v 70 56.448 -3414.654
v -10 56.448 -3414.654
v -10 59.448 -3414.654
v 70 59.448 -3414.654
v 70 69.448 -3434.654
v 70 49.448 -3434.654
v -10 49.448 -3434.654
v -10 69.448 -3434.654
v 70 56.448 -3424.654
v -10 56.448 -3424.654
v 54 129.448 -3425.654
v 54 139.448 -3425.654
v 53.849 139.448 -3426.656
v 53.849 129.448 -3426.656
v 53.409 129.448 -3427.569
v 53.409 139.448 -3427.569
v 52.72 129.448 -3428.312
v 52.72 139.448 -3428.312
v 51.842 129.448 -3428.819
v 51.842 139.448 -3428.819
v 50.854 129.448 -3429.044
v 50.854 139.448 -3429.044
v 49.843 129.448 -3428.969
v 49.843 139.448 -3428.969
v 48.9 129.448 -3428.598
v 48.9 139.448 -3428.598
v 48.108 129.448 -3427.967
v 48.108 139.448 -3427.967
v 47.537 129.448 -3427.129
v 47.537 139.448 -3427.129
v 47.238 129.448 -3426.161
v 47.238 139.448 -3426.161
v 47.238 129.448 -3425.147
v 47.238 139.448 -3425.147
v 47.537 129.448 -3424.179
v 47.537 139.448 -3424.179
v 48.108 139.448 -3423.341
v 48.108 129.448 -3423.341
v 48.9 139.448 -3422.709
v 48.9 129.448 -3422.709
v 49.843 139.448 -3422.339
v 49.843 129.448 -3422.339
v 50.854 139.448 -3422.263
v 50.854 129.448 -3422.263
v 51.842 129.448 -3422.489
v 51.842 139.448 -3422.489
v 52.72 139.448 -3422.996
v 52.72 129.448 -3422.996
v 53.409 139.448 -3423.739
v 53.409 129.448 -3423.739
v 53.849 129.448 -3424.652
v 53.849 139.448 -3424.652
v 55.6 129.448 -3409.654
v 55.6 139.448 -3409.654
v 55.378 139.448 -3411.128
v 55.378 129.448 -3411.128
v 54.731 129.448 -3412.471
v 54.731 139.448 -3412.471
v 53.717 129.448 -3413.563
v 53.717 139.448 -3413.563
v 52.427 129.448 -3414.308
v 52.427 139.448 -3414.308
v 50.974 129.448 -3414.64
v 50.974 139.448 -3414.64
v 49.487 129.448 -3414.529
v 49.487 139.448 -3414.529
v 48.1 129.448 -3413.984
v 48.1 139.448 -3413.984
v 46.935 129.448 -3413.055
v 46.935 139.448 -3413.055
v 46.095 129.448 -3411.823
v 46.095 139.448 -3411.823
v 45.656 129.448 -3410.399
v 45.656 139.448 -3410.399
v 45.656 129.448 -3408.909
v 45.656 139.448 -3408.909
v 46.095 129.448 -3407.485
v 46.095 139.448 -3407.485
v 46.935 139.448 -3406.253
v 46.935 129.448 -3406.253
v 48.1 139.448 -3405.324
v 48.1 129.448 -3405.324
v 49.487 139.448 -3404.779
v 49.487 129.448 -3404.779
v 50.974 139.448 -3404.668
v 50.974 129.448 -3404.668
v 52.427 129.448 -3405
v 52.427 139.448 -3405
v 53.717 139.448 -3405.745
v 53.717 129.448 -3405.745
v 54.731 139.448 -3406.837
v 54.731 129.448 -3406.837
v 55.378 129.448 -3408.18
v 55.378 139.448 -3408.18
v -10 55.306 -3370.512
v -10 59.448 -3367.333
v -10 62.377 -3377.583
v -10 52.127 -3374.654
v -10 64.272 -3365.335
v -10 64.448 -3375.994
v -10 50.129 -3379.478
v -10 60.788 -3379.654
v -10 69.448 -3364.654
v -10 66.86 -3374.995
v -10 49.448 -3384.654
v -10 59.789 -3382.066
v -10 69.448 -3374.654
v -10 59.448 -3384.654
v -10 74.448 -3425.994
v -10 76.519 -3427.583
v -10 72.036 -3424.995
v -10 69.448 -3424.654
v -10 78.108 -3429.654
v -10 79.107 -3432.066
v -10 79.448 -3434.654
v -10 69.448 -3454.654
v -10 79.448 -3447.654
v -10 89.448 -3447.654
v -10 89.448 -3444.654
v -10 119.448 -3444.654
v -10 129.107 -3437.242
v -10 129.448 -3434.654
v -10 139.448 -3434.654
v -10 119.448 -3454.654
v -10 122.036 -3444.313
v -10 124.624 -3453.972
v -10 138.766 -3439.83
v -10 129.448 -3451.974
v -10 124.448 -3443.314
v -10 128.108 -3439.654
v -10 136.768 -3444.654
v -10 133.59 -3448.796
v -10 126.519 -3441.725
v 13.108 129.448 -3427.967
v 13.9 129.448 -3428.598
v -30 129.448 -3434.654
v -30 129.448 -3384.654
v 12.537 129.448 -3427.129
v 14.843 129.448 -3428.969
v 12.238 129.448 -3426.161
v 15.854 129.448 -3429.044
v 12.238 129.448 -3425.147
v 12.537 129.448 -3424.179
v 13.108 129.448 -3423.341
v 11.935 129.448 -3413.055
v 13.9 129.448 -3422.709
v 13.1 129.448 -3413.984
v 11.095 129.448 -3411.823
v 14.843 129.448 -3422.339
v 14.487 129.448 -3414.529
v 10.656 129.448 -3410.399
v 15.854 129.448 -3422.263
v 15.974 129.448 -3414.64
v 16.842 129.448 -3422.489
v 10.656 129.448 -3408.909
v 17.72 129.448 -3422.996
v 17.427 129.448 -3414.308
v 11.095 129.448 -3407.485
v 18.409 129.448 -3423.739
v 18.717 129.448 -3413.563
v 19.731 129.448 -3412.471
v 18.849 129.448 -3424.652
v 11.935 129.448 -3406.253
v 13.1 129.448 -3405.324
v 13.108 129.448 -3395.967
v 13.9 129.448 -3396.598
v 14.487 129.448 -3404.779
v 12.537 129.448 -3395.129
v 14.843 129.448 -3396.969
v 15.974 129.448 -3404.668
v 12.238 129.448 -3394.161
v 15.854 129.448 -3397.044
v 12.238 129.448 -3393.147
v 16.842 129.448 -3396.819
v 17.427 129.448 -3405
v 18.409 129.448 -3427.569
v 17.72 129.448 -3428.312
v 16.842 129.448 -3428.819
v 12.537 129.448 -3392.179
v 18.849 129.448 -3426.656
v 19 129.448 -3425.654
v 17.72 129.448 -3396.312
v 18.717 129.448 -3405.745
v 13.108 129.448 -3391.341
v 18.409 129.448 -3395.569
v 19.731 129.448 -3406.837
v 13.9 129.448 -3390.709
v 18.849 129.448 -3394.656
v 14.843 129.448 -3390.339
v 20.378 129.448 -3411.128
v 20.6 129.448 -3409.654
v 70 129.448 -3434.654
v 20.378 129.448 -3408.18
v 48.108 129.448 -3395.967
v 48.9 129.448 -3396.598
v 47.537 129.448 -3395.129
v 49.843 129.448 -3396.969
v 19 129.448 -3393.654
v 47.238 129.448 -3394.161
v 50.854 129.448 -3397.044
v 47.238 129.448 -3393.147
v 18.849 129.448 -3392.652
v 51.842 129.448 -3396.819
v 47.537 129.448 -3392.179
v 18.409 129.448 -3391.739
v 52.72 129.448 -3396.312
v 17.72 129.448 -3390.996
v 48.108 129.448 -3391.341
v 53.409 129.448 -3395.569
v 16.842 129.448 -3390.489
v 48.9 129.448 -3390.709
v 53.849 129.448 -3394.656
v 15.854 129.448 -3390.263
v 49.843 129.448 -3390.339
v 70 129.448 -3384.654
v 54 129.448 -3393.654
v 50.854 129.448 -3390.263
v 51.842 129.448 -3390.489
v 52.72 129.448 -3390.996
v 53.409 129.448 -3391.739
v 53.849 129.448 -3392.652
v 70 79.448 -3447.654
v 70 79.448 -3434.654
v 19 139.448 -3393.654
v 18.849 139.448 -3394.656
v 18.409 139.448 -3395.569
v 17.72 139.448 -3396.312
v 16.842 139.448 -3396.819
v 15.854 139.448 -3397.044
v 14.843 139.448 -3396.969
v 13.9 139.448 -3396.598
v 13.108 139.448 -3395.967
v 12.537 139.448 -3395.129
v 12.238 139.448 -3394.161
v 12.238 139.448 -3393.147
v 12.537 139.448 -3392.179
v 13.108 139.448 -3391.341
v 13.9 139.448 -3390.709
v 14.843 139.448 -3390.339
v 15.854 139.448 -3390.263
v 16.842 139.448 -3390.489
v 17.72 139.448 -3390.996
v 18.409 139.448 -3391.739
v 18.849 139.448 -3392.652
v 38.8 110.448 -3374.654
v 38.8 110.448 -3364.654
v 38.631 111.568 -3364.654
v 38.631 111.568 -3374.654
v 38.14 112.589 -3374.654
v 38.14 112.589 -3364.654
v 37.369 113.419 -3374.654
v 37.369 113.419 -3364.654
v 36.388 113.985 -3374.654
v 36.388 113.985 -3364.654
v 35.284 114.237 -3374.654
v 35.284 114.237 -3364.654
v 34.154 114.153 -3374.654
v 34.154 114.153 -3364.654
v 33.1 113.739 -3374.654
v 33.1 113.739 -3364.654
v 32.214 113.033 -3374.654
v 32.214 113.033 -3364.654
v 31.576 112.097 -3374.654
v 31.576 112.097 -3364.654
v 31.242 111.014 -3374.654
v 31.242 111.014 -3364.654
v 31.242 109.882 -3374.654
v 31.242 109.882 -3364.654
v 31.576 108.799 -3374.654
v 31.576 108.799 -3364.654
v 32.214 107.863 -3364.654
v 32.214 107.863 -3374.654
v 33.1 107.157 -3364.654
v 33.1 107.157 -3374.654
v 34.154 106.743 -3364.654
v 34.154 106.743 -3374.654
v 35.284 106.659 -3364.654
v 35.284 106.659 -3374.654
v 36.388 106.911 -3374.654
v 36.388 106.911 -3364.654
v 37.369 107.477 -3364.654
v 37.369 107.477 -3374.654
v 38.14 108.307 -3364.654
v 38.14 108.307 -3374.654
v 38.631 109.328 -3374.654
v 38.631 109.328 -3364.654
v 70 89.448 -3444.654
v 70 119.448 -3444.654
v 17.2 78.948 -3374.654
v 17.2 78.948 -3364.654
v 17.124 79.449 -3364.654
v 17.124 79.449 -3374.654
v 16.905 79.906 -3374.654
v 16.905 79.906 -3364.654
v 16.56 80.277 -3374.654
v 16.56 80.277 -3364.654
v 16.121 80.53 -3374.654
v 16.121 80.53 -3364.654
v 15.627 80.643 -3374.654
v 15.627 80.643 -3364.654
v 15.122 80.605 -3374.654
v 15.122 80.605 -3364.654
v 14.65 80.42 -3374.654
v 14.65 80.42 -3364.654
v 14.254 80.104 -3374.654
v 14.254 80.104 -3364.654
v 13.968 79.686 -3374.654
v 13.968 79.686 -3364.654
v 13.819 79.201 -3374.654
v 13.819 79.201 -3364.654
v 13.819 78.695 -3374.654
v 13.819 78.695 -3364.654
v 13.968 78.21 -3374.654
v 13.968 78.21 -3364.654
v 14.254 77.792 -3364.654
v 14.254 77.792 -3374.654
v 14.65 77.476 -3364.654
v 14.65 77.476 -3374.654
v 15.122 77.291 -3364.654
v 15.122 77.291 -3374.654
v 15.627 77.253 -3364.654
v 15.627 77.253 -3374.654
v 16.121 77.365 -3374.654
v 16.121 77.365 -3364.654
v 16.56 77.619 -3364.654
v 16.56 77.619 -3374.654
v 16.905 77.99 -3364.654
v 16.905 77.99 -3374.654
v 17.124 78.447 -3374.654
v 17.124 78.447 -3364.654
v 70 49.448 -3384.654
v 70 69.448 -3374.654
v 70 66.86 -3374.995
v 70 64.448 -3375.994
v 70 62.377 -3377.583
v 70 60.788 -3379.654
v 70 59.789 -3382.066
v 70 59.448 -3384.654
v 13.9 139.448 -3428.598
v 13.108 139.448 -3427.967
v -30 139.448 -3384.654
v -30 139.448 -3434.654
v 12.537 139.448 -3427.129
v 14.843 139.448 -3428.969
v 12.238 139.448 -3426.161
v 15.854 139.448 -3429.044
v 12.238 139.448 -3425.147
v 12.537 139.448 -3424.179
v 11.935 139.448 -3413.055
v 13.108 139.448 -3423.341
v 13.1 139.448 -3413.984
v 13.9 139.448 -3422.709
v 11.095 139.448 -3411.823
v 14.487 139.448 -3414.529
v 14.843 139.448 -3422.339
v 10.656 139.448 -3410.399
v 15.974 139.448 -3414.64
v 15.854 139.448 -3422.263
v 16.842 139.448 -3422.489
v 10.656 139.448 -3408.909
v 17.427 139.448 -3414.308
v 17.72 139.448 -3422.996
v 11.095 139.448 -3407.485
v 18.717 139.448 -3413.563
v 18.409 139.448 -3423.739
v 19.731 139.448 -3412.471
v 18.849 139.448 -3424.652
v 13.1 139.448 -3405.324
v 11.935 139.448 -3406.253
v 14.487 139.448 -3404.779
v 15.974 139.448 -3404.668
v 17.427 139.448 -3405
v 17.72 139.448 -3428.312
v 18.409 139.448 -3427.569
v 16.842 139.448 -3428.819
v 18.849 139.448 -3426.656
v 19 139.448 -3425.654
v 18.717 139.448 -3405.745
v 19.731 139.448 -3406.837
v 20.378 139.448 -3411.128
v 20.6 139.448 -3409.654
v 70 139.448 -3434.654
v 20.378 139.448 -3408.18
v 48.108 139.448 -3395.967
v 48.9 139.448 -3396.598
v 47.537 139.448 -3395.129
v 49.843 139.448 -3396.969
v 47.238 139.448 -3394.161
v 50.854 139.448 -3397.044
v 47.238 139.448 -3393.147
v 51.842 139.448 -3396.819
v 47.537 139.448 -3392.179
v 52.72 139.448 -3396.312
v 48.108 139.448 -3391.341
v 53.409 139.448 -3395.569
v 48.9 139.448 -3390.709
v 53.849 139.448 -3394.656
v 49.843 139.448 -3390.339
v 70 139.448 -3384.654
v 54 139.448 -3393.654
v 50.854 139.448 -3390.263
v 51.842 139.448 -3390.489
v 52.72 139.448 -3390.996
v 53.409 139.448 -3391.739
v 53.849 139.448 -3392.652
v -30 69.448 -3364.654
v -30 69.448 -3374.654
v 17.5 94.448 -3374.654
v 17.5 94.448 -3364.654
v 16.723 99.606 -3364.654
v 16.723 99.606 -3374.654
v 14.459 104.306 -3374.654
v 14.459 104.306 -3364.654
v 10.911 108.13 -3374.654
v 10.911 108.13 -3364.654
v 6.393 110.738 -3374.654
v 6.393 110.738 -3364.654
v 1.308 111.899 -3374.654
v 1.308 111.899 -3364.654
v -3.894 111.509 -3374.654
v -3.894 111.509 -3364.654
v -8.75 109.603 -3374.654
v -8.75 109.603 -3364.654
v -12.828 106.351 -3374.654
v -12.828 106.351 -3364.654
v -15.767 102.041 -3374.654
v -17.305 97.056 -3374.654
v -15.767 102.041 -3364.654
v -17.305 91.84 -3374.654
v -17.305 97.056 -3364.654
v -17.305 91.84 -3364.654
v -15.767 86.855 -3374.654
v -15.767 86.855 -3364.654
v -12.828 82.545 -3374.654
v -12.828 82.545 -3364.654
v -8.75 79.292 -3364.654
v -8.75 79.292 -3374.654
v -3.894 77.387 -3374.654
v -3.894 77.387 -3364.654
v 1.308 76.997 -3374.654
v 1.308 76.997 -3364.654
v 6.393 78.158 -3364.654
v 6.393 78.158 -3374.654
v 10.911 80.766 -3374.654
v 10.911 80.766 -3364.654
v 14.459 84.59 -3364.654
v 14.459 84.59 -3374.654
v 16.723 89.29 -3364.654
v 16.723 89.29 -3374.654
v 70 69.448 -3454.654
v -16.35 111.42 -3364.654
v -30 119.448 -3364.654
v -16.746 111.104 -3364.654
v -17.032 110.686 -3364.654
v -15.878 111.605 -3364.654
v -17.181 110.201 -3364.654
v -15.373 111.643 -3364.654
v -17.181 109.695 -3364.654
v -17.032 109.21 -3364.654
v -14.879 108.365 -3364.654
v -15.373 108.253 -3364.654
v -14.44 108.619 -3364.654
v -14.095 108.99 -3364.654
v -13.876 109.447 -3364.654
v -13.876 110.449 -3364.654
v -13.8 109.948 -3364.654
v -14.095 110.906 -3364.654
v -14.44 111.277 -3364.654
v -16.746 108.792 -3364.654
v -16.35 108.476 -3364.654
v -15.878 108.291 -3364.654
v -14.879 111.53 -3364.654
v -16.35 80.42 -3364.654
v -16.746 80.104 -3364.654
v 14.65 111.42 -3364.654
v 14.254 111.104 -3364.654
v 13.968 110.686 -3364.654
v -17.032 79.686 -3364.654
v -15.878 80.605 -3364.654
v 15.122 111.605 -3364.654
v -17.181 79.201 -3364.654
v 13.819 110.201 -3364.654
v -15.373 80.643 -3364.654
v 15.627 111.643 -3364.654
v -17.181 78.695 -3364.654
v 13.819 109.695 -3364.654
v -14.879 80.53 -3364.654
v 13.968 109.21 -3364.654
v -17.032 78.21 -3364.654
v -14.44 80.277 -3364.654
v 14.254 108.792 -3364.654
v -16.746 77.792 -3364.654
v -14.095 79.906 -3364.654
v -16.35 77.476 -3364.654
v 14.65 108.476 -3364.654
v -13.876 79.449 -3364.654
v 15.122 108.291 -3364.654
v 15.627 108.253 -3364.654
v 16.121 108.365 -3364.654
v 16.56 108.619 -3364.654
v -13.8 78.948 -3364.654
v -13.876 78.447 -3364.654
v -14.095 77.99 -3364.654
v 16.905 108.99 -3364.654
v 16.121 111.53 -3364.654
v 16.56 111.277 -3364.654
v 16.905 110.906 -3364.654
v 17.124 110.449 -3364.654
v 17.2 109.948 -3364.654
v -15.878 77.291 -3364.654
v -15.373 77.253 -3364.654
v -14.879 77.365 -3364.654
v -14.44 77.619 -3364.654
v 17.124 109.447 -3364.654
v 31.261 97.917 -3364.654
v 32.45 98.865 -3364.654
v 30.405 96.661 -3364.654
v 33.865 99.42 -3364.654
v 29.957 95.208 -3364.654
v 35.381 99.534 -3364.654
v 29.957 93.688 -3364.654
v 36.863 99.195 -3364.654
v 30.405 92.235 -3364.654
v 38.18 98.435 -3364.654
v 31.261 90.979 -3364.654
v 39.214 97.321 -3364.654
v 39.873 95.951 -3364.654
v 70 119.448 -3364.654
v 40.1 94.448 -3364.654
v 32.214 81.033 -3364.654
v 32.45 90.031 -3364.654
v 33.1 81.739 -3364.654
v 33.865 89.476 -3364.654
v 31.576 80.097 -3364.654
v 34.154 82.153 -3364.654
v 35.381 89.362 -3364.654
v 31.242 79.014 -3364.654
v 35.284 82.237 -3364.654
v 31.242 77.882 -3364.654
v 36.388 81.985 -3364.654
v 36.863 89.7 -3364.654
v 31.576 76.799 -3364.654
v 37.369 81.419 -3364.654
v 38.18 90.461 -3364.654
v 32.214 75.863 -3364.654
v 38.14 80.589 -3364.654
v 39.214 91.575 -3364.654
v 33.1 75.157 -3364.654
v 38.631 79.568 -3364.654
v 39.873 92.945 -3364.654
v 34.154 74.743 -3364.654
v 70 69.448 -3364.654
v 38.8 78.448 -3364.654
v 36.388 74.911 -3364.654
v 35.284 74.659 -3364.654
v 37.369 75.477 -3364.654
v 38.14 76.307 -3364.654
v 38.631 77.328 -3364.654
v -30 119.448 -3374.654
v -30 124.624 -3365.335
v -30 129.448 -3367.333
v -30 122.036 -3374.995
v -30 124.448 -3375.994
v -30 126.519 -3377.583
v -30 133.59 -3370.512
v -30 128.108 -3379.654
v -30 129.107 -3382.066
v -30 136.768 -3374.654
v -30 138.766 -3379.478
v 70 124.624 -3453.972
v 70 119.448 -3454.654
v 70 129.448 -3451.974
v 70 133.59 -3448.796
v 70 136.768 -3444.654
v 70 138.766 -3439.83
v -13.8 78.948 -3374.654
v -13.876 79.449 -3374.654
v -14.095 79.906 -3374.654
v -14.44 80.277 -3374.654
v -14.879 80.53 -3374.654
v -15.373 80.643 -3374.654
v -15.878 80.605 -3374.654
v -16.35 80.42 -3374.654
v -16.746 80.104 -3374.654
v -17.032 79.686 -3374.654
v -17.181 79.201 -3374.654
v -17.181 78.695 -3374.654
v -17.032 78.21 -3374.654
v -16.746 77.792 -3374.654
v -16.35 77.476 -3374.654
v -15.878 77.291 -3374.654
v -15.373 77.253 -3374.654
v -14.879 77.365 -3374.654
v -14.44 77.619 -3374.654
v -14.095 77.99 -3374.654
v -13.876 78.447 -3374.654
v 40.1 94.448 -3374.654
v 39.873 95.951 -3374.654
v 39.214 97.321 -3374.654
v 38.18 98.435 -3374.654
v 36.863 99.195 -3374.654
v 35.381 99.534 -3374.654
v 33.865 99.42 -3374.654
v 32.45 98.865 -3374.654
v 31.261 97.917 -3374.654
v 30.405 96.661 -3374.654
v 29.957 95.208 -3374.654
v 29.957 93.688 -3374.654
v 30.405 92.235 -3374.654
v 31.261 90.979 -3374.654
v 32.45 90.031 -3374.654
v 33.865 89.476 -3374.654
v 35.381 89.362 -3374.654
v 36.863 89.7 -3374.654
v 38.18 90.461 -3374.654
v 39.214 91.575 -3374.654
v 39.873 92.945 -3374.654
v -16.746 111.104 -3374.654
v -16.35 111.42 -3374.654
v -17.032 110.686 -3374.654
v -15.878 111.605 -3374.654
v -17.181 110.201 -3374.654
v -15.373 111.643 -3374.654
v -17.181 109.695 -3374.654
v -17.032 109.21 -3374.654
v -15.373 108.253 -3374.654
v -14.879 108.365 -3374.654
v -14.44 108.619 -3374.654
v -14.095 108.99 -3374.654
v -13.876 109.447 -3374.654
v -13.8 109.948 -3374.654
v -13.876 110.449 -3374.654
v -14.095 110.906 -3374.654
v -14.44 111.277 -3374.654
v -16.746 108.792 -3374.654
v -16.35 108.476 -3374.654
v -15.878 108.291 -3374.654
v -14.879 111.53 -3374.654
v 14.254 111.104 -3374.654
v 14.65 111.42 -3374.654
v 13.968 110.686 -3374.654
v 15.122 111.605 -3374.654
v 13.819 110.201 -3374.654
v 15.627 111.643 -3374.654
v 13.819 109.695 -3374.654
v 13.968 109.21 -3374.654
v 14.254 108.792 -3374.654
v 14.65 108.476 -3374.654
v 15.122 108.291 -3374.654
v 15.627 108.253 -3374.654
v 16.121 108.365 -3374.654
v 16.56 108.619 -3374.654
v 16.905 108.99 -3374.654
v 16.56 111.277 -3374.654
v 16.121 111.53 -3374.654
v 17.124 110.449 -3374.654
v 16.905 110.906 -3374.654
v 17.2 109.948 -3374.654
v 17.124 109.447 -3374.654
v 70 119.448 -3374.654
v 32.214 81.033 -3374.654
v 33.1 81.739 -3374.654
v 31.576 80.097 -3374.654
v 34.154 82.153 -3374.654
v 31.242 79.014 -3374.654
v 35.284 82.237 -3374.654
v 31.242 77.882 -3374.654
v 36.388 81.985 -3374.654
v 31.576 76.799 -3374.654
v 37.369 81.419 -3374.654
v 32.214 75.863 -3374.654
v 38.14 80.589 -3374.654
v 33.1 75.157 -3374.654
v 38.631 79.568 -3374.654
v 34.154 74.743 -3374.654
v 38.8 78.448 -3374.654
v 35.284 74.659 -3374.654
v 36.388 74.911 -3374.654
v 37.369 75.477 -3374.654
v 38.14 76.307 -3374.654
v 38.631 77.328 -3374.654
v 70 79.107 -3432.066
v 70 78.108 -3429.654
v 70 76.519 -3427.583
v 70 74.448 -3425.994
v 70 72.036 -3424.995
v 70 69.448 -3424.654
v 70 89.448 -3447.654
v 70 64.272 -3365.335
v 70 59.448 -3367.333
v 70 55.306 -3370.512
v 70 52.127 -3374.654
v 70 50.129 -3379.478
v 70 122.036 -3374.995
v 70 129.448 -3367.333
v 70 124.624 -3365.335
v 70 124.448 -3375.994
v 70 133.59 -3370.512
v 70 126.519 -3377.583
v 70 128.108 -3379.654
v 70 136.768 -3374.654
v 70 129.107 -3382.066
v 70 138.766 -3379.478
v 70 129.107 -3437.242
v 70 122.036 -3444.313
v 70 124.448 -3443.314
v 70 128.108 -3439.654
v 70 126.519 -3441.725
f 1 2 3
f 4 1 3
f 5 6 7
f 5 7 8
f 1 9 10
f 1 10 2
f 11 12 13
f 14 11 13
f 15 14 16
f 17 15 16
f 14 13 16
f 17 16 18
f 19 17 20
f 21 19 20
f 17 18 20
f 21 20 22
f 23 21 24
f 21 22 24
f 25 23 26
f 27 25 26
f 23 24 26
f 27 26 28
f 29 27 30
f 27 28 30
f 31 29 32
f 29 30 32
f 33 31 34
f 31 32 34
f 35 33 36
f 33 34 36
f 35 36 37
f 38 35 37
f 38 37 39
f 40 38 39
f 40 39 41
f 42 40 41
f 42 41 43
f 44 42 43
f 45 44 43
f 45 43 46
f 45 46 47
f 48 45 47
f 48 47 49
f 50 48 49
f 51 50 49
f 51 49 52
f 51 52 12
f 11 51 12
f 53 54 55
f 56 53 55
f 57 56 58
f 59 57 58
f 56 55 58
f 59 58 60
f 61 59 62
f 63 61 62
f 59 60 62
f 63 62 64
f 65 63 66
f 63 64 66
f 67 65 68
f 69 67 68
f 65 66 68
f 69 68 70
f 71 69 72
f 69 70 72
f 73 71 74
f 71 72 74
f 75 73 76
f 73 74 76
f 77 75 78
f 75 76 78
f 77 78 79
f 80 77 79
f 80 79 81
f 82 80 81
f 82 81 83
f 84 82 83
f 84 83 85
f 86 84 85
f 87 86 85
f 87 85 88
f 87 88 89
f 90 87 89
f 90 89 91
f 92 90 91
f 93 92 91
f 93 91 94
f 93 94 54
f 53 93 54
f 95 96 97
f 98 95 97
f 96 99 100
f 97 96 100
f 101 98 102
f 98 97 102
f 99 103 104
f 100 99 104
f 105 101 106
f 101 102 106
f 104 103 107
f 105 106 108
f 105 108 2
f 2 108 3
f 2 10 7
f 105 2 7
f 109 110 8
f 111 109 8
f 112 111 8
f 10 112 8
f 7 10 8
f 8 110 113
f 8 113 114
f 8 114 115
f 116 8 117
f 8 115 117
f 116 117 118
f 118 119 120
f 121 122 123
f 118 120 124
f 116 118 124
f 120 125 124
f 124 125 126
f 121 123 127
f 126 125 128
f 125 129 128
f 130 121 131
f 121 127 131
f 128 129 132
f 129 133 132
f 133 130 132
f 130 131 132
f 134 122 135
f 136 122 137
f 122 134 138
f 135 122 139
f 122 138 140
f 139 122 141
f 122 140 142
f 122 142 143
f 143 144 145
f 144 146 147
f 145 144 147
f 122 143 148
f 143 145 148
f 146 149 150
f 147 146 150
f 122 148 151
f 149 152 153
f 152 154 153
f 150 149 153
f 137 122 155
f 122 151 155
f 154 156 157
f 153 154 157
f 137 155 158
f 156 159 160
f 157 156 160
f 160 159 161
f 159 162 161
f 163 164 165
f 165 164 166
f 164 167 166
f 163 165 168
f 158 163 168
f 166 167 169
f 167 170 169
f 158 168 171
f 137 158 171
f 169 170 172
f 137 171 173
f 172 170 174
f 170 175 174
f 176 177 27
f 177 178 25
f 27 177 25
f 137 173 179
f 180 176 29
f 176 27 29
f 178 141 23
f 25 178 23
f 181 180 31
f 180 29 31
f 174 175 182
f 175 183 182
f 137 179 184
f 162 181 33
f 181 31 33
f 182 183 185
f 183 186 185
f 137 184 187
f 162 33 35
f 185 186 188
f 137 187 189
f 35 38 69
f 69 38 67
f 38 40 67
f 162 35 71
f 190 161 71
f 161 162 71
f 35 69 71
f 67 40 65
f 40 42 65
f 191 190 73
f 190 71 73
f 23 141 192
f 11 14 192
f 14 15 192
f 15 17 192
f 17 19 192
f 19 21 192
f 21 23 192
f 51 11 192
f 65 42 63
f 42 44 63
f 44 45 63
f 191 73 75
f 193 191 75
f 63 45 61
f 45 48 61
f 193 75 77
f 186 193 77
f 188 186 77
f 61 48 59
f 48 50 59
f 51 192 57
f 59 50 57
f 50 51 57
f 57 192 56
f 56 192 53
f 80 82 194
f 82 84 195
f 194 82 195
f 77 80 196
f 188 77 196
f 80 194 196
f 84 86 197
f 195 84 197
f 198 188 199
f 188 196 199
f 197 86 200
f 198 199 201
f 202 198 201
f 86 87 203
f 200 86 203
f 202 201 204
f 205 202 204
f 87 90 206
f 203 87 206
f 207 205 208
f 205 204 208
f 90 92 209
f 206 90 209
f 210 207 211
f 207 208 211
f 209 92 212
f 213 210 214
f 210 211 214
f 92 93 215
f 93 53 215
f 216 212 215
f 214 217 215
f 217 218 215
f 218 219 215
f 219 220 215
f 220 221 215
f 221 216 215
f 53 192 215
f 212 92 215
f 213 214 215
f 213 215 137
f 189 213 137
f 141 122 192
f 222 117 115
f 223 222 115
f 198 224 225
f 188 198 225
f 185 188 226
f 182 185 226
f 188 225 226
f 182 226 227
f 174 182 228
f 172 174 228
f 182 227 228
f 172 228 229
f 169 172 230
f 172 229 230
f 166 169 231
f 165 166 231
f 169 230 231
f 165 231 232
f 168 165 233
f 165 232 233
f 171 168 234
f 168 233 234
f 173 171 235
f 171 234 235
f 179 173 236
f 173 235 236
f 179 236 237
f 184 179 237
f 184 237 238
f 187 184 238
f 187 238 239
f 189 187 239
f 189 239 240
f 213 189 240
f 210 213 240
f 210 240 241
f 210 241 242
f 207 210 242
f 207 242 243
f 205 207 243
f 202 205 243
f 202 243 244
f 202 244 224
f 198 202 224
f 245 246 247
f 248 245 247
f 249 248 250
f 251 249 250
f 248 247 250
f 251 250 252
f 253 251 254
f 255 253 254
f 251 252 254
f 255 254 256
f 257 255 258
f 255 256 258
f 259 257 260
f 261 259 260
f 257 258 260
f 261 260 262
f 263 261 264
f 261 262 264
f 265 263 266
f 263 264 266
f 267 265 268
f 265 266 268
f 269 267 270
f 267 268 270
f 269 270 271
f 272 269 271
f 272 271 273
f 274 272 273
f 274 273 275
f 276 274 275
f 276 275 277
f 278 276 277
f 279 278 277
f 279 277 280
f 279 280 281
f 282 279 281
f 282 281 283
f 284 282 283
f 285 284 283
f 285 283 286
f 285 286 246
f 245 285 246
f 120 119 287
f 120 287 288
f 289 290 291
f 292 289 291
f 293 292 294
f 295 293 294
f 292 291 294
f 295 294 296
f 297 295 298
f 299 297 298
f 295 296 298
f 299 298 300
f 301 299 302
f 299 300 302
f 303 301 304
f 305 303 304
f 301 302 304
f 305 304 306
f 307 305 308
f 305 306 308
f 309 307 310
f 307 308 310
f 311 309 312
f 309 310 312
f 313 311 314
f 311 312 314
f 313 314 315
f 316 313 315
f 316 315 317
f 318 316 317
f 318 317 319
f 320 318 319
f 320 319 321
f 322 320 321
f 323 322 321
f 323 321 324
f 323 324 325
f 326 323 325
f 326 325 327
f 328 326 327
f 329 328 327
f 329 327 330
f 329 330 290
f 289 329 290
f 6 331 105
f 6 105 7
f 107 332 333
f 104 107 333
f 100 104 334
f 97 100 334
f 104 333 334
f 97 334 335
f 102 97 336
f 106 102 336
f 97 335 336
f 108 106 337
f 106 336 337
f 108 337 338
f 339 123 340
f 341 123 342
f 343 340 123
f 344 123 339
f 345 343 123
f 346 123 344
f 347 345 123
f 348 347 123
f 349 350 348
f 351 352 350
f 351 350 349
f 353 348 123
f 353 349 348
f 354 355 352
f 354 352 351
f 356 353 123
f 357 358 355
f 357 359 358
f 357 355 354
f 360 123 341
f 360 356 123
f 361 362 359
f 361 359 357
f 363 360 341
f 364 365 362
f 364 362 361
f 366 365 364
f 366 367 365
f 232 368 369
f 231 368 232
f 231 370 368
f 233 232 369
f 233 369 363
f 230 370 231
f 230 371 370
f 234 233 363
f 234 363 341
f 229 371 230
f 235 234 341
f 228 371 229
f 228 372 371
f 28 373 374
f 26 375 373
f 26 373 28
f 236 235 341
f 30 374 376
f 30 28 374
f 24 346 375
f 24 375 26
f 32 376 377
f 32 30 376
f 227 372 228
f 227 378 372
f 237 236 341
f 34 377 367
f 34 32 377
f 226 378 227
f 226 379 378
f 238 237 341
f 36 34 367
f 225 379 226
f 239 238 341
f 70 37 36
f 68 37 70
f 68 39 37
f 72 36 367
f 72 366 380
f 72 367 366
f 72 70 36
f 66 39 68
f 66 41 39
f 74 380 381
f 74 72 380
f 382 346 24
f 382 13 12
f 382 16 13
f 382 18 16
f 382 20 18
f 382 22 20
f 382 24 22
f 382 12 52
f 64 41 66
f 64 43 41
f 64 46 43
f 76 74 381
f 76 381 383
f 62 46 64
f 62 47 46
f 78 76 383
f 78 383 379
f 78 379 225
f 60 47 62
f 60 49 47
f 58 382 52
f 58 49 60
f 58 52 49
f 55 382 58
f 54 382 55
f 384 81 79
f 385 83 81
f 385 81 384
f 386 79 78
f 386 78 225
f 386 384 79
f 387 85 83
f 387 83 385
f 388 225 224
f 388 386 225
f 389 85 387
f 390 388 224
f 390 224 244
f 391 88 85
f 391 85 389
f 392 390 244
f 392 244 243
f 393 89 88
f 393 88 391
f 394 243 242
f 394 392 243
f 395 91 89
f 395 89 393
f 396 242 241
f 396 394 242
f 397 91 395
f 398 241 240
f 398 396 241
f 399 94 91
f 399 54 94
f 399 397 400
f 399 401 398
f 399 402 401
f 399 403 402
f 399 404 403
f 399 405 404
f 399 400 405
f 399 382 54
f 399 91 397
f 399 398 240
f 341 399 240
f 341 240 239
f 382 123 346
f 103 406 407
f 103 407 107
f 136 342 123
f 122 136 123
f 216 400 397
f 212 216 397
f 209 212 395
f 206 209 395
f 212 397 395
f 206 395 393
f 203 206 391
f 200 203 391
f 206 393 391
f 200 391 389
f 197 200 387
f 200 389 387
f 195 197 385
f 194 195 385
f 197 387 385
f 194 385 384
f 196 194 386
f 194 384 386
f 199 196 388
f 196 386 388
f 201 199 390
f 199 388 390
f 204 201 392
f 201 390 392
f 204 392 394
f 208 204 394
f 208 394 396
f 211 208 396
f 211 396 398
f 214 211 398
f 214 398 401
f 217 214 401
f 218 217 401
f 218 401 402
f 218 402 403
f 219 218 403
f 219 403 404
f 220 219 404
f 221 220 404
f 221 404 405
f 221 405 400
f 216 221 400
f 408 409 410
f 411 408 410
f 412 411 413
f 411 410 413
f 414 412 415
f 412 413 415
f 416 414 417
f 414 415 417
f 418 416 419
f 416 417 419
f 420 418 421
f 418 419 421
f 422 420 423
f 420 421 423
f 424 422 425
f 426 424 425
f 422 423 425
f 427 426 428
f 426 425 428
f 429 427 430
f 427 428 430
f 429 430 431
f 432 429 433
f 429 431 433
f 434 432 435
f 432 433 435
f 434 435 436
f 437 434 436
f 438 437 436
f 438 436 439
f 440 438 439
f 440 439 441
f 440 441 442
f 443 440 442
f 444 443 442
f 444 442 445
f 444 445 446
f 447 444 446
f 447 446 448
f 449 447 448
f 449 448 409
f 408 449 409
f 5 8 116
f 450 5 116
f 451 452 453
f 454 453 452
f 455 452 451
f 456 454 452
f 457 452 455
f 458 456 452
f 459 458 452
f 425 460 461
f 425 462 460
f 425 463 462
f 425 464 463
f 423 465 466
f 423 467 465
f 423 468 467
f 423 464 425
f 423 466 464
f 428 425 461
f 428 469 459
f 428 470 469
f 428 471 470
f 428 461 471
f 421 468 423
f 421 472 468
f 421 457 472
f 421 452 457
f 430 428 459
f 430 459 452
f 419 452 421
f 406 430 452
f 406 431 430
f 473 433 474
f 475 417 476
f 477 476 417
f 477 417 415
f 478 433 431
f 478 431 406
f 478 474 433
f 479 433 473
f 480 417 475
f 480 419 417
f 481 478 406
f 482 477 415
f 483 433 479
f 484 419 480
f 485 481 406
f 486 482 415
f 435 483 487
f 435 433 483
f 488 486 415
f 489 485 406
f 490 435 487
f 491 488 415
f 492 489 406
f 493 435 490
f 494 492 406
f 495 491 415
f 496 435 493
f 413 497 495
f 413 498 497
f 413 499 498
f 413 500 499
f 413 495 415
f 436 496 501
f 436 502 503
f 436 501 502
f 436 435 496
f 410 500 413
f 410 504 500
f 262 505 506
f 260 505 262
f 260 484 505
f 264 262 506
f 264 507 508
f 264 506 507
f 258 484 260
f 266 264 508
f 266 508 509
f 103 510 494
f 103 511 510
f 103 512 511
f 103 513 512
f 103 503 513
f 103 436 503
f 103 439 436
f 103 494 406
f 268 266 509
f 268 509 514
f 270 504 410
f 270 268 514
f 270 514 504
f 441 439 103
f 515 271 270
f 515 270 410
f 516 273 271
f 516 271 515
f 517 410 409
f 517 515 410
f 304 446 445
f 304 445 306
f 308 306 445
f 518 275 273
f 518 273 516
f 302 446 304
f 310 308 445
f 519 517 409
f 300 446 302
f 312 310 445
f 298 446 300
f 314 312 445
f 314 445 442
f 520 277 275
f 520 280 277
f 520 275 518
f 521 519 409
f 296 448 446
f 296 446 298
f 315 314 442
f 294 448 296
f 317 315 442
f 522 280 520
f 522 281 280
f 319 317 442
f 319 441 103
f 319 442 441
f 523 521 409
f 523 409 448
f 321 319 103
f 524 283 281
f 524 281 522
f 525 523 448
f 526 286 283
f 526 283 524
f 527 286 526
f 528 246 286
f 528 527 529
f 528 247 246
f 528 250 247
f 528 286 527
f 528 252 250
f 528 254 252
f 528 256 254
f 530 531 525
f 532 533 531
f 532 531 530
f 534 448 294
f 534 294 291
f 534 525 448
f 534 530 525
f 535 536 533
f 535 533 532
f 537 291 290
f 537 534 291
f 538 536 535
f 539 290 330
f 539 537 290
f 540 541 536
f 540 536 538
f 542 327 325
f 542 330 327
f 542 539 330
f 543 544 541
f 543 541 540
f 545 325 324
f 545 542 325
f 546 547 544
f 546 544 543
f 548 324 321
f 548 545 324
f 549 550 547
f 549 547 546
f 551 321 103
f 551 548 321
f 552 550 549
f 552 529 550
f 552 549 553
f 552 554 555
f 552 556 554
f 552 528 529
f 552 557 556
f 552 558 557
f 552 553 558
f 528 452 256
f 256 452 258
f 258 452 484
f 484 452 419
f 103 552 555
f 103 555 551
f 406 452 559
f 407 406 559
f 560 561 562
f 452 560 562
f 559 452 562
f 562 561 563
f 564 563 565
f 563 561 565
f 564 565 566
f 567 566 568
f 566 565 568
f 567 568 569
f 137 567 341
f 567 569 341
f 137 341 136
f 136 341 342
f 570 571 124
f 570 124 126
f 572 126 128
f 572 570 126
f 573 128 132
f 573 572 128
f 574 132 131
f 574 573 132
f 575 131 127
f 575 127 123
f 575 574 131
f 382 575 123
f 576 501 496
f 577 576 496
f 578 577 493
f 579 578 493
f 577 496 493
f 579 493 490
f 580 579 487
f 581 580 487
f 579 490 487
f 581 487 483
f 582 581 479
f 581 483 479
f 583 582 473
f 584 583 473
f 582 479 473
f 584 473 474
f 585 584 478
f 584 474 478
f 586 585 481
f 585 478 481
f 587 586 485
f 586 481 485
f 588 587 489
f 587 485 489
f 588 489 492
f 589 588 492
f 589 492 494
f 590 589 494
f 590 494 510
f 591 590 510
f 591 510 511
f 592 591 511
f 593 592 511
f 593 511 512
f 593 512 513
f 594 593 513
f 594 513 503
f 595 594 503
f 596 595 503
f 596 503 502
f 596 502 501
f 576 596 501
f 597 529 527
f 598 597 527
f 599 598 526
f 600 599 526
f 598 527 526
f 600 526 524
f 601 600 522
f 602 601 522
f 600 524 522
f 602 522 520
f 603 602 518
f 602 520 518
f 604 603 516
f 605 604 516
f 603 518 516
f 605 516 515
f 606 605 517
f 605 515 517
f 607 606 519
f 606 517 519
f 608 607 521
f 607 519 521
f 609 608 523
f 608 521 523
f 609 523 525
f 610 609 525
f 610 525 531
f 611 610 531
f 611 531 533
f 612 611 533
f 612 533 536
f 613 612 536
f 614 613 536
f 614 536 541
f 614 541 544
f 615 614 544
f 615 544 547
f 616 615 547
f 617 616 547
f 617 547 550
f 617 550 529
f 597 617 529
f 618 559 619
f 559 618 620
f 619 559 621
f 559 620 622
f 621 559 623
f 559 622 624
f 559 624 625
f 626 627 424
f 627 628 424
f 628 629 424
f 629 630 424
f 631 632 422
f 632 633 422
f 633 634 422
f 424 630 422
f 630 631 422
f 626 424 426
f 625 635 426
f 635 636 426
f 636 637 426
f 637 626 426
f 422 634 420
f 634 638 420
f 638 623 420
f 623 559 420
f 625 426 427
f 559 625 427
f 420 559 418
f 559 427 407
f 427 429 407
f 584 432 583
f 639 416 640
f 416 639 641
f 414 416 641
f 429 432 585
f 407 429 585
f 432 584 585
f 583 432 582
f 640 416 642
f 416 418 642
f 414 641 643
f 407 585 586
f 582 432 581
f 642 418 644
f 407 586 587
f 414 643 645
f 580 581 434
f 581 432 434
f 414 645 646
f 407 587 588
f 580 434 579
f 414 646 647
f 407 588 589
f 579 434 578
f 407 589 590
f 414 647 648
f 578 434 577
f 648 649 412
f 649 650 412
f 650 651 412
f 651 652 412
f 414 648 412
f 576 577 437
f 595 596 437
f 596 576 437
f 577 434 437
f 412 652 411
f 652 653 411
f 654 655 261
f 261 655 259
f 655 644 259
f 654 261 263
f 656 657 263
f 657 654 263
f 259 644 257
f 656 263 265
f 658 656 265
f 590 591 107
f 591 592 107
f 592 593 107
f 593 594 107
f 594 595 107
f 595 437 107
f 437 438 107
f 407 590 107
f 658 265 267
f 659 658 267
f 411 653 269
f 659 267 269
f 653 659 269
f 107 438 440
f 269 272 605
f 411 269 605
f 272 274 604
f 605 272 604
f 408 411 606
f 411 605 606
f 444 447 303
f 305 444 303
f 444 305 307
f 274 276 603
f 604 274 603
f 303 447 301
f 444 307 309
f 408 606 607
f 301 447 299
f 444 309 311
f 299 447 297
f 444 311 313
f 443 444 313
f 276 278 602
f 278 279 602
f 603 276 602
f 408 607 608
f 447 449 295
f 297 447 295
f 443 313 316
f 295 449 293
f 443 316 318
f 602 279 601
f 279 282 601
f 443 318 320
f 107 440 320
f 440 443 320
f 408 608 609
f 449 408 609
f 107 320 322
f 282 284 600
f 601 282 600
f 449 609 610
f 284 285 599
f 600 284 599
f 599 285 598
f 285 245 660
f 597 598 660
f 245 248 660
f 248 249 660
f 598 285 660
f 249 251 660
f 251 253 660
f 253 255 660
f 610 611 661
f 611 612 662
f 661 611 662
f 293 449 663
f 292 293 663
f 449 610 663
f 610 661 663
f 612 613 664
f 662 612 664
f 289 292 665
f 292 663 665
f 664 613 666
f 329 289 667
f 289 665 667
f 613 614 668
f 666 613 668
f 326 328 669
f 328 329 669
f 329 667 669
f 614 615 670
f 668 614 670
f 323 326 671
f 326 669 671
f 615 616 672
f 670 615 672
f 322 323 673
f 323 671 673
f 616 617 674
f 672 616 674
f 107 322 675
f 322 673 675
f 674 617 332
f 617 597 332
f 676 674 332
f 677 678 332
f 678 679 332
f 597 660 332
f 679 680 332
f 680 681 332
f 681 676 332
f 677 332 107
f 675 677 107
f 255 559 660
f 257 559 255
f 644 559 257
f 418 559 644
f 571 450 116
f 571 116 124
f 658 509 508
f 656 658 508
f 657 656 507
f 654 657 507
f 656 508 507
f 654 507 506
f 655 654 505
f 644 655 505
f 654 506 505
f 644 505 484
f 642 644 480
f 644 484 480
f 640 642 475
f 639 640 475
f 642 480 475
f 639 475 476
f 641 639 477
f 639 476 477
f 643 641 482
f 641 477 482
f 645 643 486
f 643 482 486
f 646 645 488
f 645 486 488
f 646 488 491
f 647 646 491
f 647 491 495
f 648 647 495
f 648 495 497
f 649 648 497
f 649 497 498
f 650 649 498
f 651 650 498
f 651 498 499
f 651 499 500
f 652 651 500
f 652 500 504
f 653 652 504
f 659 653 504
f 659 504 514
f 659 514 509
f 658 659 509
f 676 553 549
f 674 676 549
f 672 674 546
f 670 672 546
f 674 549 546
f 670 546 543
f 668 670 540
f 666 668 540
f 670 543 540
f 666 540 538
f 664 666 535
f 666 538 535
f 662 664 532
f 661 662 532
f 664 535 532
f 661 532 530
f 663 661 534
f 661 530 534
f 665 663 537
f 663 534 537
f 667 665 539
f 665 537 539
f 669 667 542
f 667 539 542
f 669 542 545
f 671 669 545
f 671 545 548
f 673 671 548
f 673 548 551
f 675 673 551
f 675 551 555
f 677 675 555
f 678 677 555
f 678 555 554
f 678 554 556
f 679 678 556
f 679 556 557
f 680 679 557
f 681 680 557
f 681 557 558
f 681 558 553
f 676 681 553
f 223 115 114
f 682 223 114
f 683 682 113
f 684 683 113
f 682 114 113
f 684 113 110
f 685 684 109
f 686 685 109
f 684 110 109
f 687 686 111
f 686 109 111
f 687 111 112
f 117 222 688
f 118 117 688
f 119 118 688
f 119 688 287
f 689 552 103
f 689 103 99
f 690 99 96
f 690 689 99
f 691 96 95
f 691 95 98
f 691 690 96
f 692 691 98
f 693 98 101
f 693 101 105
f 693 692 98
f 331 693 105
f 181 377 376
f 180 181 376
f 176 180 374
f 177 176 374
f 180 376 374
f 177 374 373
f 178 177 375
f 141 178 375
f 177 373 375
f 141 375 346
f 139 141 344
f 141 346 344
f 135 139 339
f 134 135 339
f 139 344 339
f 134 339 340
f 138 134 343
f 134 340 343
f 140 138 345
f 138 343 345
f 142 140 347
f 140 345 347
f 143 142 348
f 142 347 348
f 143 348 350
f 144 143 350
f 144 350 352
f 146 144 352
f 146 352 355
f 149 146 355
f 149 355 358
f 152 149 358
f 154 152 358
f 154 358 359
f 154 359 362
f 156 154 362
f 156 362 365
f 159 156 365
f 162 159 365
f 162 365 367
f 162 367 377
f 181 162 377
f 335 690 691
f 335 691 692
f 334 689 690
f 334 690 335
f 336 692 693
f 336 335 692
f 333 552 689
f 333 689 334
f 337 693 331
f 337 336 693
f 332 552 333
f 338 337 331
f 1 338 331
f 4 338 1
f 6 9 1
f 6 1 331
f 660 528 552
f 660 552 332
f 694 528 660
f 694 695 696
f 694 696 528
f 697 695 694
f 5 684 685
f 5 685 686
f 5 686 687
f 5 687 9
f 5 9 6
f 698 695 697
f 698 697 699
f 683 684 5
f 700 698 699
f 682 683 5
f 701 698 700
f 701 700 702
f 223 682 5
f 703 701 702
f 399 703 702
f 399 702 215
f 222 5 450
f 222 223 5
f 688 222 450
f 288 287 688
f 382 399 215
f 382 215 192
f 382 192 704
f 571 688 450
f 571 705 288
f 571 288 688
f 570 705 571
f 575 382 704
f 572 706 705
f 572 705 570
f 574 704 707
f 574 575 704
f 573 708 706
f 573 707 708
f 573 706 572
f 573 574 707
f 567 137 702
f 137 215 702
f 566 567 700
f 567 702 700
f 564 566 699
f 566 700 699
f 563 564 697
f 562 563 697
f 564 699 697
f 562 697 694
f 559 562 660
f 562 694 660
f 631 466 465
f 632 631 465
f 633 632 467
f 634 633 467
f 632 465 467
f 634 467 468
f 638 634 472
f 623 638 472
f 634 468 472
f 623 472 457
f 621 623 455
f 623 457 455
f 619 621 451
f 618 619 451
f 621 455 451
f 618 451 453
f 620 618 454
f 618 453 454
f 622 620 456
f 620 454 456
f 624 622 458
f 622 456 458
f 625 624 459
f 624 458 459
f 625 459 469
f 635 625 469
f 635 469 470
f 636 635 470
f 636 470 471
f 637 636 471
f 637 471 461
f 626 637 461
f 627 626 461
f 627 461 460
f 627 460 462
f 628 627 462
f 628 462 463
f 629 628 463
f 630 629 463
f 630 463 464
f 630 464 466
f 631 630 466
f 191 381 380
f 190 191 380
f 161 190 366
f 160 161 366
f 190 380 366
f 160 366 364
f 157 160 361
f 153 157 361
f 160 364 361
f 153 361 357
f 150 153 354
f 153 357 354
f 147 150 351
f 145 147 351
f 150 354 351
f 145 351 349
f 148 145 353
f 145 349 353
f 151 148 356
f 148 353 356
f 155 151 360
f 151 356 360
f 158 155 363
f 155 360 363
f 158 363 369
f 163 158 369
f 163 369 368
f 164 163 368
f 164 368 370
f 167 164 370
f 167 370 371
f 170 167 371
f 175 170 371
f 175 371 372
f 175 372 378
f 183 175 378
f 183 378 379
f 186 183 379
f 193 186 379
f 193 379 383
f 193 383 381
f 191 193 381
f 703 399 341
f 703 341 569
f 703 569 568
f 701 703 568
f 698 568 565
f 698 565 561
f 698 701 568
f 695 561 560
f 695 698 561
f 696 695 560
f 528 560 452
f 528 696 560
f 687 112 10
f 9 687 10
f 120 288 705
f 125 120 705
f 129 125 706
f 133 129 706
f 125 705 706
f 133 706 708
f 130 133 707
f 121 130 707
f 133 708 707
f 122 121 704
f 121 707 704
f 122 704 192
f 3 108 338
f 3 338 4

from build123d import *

# Parameters (mm, degrees)
BOSS_EXTRUDE1_DEPTH      = 70
BOSS_EXTRUDE1_DEPTH_BACK = 30
CUT_EXTRUDE1_REACH       = 92
SKETCH3_R                = 1.7
SKETCH3_R_2              = 17.5
SKETCH3_R_3              = 5.1
SKETCH3_R_4              = 3.8
CUT_EXTRUDE2_REACH       = 92
SKETCH4_R                = 5
SKETCH4_R_2              = 3.4
SKETCH5_W                = 20
SKETCH5_H                = 20
CUT_EXTRUDE3_DEPTH       = 1
CUT_EXTRUDE3_DEPTH_BACK  = 91
SKETCH6_W                = 20
SKETCH6_H                = 20
CUT_EXTRUDE4_DEPTH       = 91
SKETCH7_W                = 3
SKETCH7_H                = 20
SKETCH7_W_2              = 20
SKETCH7_H_2              = 3
CUT_EXTRUDE5_DEPTH       = 81
BOSS_EXTRUDE2_DEPTH      = 80


with BuildPart() as part:
    # Sketch2 → Boss-Extrude1 (new body, two sides)
    with BuildSketch(Plane(origin=(0, 0, 0), x_dir=(0, 0, -1), z_dir=(1, 0, 0))) as boss_extrude1_sk:
        with BuildLine():
            Line((3434.65392981, 139.447907294), (3384.65392981, 139.447907294))
            ThreePointArc((3384.65392981, 139.447907294), (3370.511794186, 133.590042917), (3364.65392981, 119.447907294))
            Line((3364.65392981, 119.447907294), (3364.65392981, 69.447907294))
            ThreePointArc((3364.65392981, 69.447907294), (3370.511794186, 55.30577167), (3384.65392981, 49.447907294))
            Line((3384.65392981, 49.447907294), (3434.65392981, 49.447907294))
            ThreePointArc((3434.65392981, 49.447907294), (3448.796065434, 55.30577167), (3454.65392981, 69.447907294))
            Line((3454.65392981, 69.447907294), (3454.65392981, 119.447907294))
            ThreePointArc((3454.65392981, 119.447907294), (3448.796065434, 133.590042917), (3434.65392981, 139.447907294))
        make_face()
        with BuildLine():
            Line((3434.65392981, 129.447907294), (3384.65392981, 129.447907294))
            ThreePointArc((3384.65392981, 129.447907294), (3377.582861998, 126.518975106), (3374.65392981, 119.447907294))
            Line((3374.65392981, 119.447907294), (3374.65392981, 69.447907294))
            ThreePointArc((3374.65392981, 69.447907294), (3377.582861998, 62.376839482), (3384.65392981, 59.447907294))
            Line((3384.65392981, 59.447907294), (3434.65392981, 59.447907294))
            ThreePointArc((3434.65392981, 59.447907294), (3441.724997622, 62.376839482), (3444.65392981, 69.447907294))
            Line((3444.65392981, 69.447907294), (3444.65392981, 119.447907294))
            ThreePointArc((3444.65392981, 119.447907294), (3441.724997622, 126.518975106), (3434.65392981, 129.447907294))
        make_face(mode=Mode.SUBTRACT)
    extrude(amount=BOSS_EXTRUDE1_DEPTH)
    extrude(boss_extrude1_sk.sketch, amount=-BOSS_EXTRUDE1_DEPTH_BACK)

    # Sketch3 → Cut-Extrude1 (cut, up to next)
    with BuildSketch(Plane.XY.offset(-3364.65392981), mode=Mode.PRIVATE) as cut_extrude1_sk1:
        with Locations((15.499999999, 78.947907294)):
            Circle(SKETCH3_R)
    cut_extrude1_tool1 = extrude(cut_extrude1_sk1.sketch, amount=-CUT_EXTRUDE1_REACH, mode=Mode.PRIVATE) & part.part
    add(cut_extrude1_tool1.solids().sort_by_distance((15.5, 78.947907, -3364.65393))[0], mode=Mode.SUBTRACT)
    # Sketch3 → Cut-Extrude1 (cut, up to next)
    with BuildSketch(Plane.XY.offset(-3364.65392981), mode=Mode.PRIVATE) as cut_extrude1_sk2:
        with Locations((15.499999999, 109.947907294)):
            Circle(SKETCH3_R)
    cut_extrude1_tool2 = extrude(cut_extrude1_sk2.sketch, amount=-CUT_EXTRUDE1_REACH, mode=Mode.PRIVATE) & part.part
    add(cut_extrude1_tool2.solids().sort_by_distance((15.5, 109.947907, -3364.65393))[0], mode=Mode.SUBTRACT)
    # Sketch3 → Cut-Extrude1 (cut, up to next)
    with BuildSketch(Plane.XY.offset(-3364.65392981), mode=Mode.PRIVATE) as cut_extrude1_sk3:
        with Locations((-15.500000001, 109.947907294)):
            Circle(SKETCH3_R)
    cut_extrude1_tool3 = extrude(cut_extrude1_sk3.sketch, amount=-CUT_EXTRUDE1_REACH, mode=Mode.PRIVATE) & part.part
    add(cut_extrude1_tool3.solids().sort_by_distance((-15.5, 109.947907, -3364.65393))[0], mode=Mode.SUBTRACT)
    # Sketch3 → Cut-Extrude1 (cut, up to next)
    with BuildSketch(Plane.XY.offset(-3364.65392981), mode=Mode.PRIVATE) as cut_extrude1_sk4:
        with Locations((-15.500000001, 78.947907294)):
            Circle(SKETCH3_R)
    cut_extrude1_tool4 = extrude(cut_extrude1_sk4.sketch, amount=-CUT_EXTRUDE1_REACH, mode=Mode.PRIVATE) & part.part
    add(cut_extrude1_tool4.solids().sort_by_distance((-15.5, 78.947907, -3364.65393))[0], mode=Mode.SUBTRACT)
    # Sketch3 → Cut-Extrude1 (cut, up to next)
    with BuildSketch(Plane.XY.offset(-3364.65392981), mode=Mode.PRIVATE) as cut_extrude1_sk5:
        with Locations((0, 94.447907293)):
            Circle(SKETCH3_R_2)
    cut_extrude1_tool5 = extrude(cut_extrude1_sk5.sketch, amount=-CUT_EXTRUDE1_REACH, mode=Mode.PRIVATE) & part.part
    add(cut_extrude1_tool5.solids().sort_by_distance((0, 94.447907, -3364.65393))[0], mode=Mode.SUBTRACT)
    # Sketch3 → Cut-Extrude1 (cut, up to next)
    with BuildSketch(Plane.XY.offset(-3364.65392981), mode=Mode.PRIVATE) as cut_extrude1_sk6:
        with Locations((34.999999999, 94.447907294)):
            Circle(SKETCH3_R_3)
    cut_extrude1_tool6 = extrude(cut_extrude1_sk6.sketch, amount=-CUT_EXTRUDE1_REACH, mode=Mode.PRIVATE) & part.part
    add(cut_extrude1_tool6.solids().sort_by_distance((35, 94.447907, -3364.65393))[0], mode=Mode.SUBTRACT)
    # Sketch3 → Cut-Extrude1 (cut, up to next)
    with BuildSketch(Plane.XY.offset(-3364.65392981), mode=Mode.PRIVATE) as cut_extrude1_sk7:
        with Locations((35, 78.447907293)):
            Circle(SKETCH3_R_4)
    cut_extrude1_tool7 = extrude(cut_extrude1_sk7.sketch, amount=-CUT_EXTRUDE1_REACH, mode=Mode.PRIVATE) & part.part
    add(cut_extrude1_tool7.solids().sort_by_distance((35, 78.447907, -3364.65393))[0], mode=Mode.SUBTRACT)
    # Sketch3 → Cut-Extrude1 (cut, up to next)
    with BuildSketch(Plane.XY.offset(-3364.65392981), mode=Mode.PRIVATE) as cut_extrude1_sk8:
        with Locations((35, 110.447907293)):
            Circle(SKETCH3_R_4)
    cut_extrude1_tool8 = extrude(cut_extrude1_sk8.sketch, amount=-CUT_EXTRUDE1_REACH, mode=Mode.PRIVATE) & part.part
    add(cut_extrude1_tool8.solids().sort_by_distance((35, 110.447907, -3364.65393))[0], mode=Mode.SUBTRACT)

    # Sketch4 → Cut-Extrude2 (cut, up to next)
    with BuildSketch(Plane(origin=(0, 139.447907294, 0), x_dir=(1, 0, 0), z_dir=(0, 1, 0)), mode=Mode.PRIVATE) as cut_extrude2_sk1:
        with Locations((15.6, 3409.65392981)):
            Circle(SKETCH4_R)
    cut_extrude2_tool1 = extrude(cut_extrude2_sk1.sketch, amount=-CUT_EXTRUDE2_REACH, mode=Mode.PRIVATE) & part.part
    add(cut_extrude2_tool1.solids().sort_by_distance((15.6, 139.447907, -3409.65393))[0], mode=Mode.SUBTRACT)
    # Sketch4 → Cut-Extrude2 (cut, up to next)
    with BuildSketch(Plane(origin=(0, 139.447907294, 0), x_dir=(1, 0, 0), z_dir=(0, 1, 0)), mode=Mode.PRIVATE) as cut_extrude2_sk2:
        with Locations((50.6, 3409.65392981)):
            Circle(SKETCH4_R)
    cut_extrude2_tool2 = extrude(cut_extrude2_sk2.sketch, amount=-CUT_EXTRUDE2_REACH, mode=Mode.PRIVATE) & part.part
    add(cut_extrude2_tool2.solids().sort_by_distance((50.6, 139.447907, -3409.65393))[0], mode=Mode.SUBTRACT)
    # Sketch4 → Cut-Extrude2 (cut, up to next)
    with BuildSketch(Plane(origin=(0, 139.447907294, 0), x_dir=(1, 0, 0), z_dir=(0, 1, 0)), mode=Mode.PRIVATE) as cut_extrude2_sk3:
        with Locations((50.6, 3425.65392981)):
            Circle(SKETCH4_R_2)
    cut_extrude2_tool3 = extrude(cut_extrude2_sk3.sketch, amount=-CUT_EXTRUDE2_REACH, mode=Mode.PRIVATE) & part.part
    add(cut_extrude2_tool3.solids().sort_by_distance((50.6, 139.447907, -3425.65393))[0], mode=Mode.SUBTRACT)
    # Sketch4 → Cut-Extrude2 (cut, up to next)
    with BuildSketch(Plane(origin=(0, 139.447907294, 0), x_dir=(1, 0, 0), z_dir=(0, 1, 0)), mode=Mode.PRIVATE) as cut_extrude2_sk4:
        with Locations((50.6, 3393.65392981)):
            Circle(SKETCH4_R_2)
    cut_extrude2_tool4 = extrude(cut_extrude2_sk4.sketch, amount=-CUT_EXTRUDE2_REACH, mode=Mode.PRIVATE) & part.part
    add(cut_extrude2_tool4.solids().sort_by_distance((50.6, 139.447907, -3393.65393))[0], mode=Mode.SUBTRACT)
    # Sketch4 → Cut-Extrude2 (cut, up to next)
    with BuildSketch(Plane(origin=(0, 139.447907294, 0), x_dir=(1, 0, 0), z_dir=(0, 1, 0)), mode=Mode.PRIVATE) as cut_extrude2_sk5:
        with Locations((15.6, 3425.65392981)):
            Circle(SKETCH4_R_2)
    cut_extrude2_tool5 = extrude(cut_extrude2_sk5.sketch, amount=-CUT_EXTRUDE2_REACH, mode=Mode.PRIVATE) & part.part
    add(cut_extrude2_tool5.solids().sort_by_distance((15.6, 139.447907, -3425.65393))[0], mode=Mode.SUBTRACT)
    # Sketch4 → Cut-Extrude2 (cut, up to next)
    with BuildSketch(Plane(origin=(0, 139.447907294, 0), x_dir=(1, 0, 0), z_dir=(0, 1, 0)), mode=Mode.PRIVATE) as cut_extrude2_sk6:
        with Locations((15.6, 3393.65392981)):
            Circle(SKETCH4_R_2)
    cut_extrude2_tool6 = extrude(cut_extrude2_sk6.sketch, amount=-CUT_EXTRUDE2_REACH, mode=Mode.PRIVATE) & part.part
    add(cut_extrude2_tool6.solids().sort_by_distance((15.6, 139.447907, -3393.65393))[0], mode=Mode.SUBTRACT)

    # Sketch5 → Cut-Extrude3 (cut, two sides)
    with BuildSketch(Plane.XY.offset(-3364.65392981)) as cut_extrude3_sk:
        with Locations((-20, 59.447907294)):
            Rectangle(SKETCH5_W, SKETCH5_H)
    extrude(amount=CUT_EXTRUDE3_DEPTH, mode=Mode.SUBTRACT)
    extrude(cut_extrude3_sk.sketch, amount=-CUT_EXTRUDE3_DEPTH_BACK, mode=Mode.SUBTRACT)

    # Sketch6 → Cut-Extrude4 (cut, through all)
    with BuildSketch(Plane(origin=(0, 139.447907294, 0), x_dir=(1, 0, 0), z_dir=(0, 1, 0))):
        with Locations((-20, 3444.65392981)):
            Rectangle(SKETCH6_W, SKETCH6_H)
    extrude(amount=-CUT_EXTRUDE4_DEPTH, mode=Mode.SUBTRACT)

    # Sketch7 → Cut-Extrude5 (cut, through all)
    with BuildSketch(Plane.ZY.offset(10)):
        with BuildLine():
            Line((-3447.65392981, 69.447907294), (-3454.65392981, 69.447907294))
            ThreePointArc((-3454.65392981, 69.447907294), (-3448.796065434, 55.30577167), (-3434.65392981, 49.447907294))
            Line((-3434.65392981, 49.447907294), (-3434.65392981, 56.447907294))
            Line((-3434.65392981, 56.447907294), (-3434.65392981, 59.447907294))
            ThreePointArc((-3434.65392981, 59.447907294), (-3441.724997622, 62.376839482), (-3444.65392981, 69.447907294))
            Line((-3444.65392981, 69.447907294), (-3447.65392981, 69.447907294))
        make_face()
        with Locations((-3446.15392981, 79.447907294)):
            Rectangle(SKETCH7_W, SKETCH7_H)
        with Locations((-3424.65392981, 57.947907294)):
            Rectangle(SKETCH7_W_2, SKETCH7_H_2)
    extrude(amount=-CUT_EXTRUDE5_DEPTH, mode=Mode.SUBTRACT)

    # Sketch8 → Boss-Extrude2 (add)
    with BuildSketch(Plane.ZY.offset(10)):
        with BuildLine():
            Line((-3454.65392981, 79.447907294), (-3434.65392981, 79.447907294))
            ThreePointArc((-3434.65392981, 79.447907294), (-3427.582861998, 76.518975106), (-3424.65392981, 69.447907294))
            Line((-3424.65392981, 69.447907294), (-3424.65392981, 49.447907294))
            Line((-3424.65392981, 49.447907294), (-3434.65392981, 49.447907294))
            Line((-3434.65392981, 49.447907294), (-3434.65392981, 69.447907294))
            Line((-3434.65392981, 69.447907294), (-3454.65392981, 69.447907294))
            Line((-3454.65392981, 69.447907294), (-3454.65392981, 79.447907294))
        make_face()
    extrude(amount=-BOSS_EXTRUDE2_DEPTH)


solid = part.part
